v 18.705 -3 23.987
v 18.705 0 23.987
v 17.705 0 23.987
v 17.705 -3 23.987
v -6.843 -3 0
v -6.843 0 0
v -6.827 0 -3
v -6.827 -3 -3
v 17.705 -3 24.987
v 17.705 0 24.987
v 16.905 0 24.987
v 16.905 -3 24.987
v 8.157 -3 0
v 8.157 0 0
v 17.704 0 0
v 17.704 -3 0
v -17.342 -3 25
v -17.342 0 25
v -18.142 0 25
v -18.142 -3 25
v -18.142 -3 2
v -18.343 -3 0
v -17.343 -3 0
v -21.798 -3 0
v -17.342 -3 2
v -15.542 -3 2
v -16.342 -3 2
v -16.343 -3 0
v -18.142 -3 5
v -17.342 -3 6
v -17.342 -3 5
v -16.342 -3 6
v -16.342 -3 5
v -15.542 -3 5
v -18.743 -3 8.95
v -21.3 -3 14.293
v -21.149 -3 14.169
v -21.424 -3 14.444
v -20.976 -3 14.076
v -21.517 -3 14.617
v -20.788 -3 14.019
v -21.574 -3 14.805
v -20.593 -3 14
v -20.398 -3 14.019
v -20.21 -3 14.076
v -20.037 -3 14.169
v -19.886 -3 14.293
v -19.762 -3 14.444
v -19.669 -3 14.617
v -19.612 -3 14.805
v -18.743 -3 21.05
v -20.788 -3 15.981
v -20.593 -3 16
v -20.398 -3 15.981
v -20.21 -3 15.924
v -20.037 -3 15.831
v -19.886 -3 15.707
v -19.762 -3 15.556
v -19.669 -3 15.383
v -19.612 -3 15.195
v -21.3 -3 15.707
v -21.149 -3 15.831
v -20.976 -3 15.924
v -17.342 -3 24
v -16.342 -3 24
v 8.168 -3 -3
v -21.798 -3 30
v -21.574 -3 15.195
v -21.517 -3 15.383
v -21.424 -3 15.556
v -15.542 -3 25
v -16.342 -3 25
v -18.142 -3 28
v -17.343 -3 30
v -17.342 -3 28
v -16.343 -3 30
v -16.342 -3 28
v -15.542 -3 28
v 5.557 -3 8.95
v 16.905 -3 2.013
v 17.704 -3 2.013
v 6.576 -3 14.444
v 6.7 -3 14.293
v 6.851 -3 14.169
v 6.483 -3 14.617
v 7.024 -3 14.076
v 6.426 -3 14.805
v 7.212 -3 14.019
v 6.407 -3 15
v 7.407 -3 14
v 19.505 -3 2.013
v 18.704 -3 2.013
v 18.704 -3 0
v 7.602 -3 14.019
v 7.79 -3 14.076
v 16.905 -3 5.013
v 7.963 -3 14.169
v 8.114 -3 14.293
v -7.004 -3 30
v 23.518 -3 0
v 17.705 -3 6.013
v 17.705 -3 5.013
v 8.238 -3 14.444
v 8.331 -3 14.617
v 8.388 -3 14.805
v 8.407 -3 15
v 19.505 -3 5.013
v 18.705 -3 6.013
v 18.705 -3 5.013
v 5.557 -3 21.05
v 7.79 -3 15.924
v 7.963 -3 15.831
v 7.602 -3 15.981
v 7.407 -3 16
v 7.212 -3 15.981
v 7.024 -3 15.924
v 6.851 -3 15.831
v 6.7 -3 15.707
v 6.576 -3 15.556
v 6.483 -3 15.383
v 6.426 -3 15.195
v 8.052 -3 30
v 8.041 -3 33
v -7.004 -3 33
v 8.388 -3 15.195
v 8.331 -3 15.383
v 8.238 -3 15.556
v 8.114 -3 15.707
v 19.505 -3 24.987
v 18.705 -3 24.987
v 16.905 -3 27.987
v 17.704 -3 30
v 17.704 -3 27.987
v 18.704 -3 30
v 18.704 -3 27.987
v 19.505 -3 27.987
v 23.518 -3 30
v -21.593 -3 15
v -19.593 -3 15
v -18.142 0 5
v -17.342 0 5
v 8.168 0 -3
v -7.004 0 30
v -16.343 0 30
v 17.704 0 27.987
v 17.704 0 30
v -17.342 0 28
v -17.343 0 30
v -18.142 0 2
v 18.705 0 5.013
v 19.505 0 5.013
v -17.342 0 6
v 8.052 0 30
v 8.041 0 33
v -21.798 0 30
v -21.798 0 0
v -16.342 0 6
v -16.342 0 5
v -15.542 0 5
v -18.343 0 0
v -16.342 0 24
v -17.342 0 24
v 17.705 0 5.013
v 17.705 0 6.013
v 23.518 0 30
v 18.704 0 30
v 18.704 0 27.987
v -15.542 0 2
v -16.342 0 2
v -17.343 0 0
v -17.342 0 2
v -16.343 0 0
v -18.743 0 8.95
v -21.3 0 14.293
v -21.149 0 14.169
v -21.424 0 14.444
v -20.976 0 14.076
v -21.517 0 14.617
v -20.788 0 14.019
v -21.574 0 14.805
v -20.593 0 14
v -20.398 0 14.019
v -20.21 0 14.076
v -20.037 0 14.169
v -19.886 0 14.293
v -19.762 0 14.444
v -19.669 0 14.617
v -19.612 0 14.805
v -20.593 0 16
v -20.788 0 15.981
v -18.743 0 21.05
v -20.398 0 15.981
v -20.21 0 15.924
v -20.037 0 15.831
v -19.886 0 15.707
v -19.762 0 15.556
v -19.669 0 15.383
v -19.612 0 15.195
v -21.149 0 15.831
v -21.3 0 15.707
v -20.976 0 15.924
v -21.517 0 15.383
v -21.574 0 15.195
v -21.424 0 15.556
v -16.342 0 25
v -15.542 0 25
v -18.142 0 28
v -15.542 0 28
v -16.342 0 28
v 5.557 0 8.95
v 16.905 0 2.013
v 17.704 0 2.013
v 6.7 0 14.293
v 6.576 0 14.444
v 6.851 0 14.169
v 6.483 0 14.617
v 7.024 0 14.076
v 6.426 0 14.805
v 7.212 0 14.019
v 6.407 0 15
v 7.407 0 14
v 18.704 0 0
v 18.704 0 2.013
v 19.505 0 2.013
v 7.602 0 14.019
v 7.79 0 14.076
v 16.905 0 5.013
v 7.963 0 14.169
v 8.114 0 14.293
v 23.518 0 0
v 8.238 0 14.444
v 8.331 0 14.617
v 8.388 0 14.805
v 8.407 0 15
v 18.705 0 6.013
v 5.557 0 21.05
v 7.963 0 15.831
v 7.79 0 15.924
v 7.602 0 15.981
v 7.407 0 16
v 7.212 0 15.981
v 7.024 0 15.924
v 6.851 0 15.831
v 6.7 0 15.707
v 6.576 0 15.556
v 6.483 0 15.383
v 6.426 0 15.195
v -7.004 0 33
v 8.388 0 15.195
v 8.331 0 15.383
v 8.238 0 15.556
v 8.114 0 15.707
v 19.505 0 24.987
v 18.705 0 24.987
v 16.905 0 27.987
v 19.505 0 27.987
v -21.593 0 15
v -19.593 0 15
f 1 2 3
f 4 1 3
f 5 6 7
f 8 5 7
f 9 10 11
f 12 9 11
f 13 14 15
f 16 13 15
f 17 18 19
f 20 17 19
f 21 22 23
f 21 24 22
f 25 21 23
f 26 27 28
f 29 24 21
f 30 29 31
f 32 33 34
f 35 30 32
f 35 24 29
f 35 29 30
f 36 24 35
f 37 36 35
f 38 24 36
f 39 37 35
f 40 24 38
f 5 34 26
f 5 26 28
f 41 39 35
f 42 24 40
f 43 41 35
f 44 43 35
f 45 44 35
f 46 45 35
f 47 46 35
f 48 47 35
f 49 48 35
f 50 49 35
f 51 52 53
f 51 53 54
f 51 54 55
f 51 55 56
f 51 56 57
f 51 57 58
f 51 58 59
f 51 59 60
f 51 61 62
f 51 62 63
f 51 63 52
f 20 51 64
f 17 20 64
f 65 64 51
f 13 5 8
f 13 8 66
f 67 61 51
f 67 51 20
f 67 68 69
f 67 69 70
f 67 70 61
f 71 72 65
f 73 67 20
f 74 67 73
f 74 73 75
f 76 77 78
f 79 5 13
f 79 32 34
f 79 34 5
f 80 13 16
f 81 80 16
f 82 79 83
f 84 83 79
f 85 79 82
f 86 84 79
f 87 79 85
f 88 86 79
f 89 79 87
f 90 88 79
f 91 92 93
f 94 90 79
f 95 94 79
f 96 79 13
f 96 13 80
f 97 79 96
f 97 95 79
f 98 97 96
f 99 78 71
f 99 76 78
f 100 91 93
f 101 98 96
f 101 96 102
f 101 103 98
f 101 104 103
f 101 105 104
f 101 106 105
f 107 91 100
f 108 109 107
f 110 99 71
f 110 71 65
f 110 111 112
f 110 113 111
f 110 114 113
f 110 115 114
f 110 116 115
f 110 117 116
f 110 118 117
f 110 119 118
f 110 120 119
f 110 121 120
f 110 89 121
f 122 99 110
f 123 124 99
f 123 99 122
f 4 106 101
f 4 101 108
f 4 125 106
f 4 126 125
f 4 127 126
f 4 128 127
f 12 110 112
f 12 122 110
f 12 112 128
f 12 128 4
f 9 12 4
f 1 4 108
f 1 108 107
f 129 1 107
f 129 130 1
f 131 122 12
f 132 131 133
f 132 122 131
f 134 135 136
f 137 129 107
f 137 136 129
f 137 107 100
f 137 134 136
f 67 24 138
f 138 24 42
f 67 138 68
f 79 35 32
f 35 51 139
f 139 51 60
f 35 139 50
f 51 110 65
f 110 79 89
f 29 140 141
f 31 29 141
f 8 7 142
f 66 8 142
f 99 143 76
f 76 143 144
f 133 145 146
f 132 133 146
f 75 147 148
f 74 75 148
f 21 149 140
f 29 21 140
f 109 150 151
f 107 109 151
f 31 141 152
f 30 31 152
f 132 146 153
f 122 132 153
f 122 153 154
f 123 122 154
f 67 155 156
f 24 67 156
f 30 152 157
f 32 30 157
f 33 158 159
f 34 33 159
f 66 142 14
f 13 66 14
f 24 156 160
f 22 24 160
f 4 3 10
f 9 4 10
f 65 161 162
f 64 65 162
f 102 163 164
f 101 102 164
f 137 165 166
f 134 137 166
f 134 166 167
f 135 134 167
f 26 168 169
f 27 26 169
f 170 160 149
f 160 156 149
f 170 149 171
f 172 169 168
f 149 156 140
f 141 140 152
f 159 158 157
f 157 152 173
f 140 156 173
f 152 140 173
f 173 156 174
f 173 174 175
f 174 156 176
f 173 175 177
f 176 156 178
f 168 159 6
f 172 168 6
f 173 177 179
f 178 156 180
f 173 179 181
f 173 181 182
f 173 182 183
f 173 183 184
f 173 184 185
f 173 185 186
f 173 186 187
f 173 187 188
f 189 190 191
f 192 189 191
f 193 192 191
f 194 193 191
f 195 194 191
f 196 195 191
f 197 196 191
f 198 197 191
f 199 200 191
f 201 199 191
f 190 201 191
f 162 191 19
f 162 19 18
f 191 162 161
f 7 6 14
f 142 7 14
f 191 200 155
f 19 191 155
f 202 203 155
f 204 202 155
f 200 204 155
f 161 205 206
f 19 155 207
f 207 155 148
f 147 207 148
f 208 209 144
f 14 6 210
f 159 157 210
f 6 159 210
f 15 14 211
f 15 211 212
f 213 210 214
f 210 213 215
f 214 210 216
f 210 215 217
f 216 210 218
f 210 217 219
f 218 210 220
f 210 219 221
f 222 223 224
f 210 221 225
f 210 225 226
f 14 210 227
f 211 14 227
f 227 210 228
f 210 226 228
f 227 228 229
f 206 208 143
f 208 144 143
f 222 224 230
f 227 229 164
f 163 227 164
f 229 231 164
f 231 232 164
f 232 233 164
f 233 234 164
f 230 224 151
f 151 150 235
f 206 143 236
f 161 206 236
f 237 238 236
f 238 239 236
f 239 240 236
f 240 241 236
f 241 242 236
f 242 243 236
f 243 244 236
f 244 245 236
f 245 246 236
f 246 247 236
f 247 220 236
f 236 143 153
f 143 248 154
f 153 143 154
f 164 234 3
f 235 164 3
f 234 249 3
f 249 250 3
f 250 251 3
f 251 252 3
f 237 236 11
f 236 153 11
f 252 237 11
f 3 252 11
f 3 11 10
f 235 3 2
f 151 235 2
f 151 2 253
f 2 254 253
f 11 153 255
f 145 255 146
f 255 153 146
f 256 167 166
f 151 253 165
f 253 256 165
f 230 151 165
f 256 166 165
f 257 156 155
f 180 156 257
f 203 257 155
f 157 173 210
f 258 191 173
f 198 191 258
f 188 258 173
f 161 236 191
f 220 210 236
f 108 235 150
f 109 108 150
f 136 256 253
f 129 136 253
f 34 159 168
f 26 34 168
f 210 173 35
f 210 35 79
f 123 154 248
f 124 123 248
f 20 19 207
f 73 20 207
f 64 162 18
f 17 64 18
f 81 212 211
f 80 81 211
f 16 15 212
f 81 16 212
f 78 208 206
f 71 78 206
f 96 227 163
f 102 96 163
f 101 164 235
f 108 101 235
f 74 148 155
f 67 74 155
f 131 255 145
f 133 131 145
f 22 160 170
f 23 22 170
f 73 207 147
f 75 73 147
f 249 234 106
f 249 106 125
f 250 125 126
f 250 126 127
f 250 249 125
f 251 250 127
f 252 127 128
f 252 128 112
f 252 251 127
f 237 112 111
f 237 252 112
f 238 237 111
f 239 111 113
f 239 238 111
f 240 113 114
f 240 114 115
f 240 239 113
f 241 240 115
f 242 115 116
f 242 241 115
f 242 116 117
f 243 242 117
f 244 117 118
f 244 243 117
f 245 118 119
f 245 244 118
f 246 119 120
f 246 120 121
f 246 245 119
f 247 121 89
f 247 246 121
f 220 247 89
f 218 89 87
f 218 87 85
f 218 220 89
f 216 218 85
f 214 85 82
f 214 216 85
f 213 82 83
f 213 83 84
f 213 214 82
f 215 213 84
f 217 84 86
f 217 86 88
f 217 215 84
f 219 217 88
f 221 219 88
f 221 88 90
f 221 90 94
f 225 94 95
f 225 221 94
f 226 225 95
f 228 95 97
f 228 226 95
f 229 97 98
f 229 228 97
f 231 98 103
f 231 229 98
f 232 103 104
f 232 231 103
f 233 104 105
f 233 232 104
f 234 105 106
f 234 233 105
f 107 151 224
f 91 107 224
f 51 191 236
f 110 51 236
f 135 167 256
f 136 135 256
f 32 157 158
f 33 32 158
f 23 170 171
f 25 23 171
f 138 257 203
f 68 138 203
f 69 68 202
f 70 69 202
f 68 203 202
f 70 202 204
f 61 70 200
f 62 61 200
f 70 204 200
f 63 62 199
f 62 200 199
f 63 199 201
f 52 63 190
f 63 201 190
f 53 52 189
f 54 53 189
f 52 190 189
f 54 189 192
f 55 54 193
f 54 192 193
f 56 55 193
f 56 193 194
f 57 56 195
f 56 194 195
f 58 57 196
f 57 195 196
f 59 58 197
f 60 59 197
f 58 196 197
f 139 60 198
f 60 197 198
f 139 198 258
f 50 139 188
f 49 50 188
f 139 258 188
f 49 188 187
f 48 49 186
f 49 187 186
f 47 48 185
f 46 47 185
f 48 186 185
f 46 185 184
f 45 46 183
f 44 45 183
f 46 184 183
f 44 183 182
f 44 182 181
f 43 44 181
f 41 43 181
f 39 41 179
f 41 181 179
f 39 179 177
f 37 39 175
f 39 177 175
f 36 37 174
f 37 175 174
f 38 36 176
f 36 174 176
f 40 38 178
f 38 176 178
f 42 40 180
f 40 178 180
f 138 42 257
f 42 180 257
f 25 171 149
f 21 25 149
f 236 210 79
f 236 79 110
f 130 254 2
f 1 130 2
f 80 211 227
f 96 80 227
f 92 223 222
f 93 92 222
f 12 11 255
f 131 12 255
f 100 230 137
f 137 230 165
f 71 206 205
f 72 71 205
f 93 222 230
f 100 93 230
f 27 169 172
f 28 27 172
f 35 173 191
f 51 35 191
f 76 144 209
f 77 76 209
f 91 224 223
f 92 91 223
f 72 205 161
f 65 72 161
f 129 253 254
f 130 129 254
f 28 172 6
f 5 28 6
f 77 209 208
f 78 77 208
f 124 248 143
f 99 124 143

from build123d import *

# Parameters (mm, degrees)
F3_W     = 24.3006017764
F3_H     = 12.100000065
F3_R     = 1
F4_DEPTH = 3


# Not quite as in the source:
# - ends of sketch curves that miss each other by under 0.0002 mm in the source are joined


with BuildPart() as f4:
    # F3 (on Front) → F4 (new body)
    with BuildSketch(Plane.XZ):
        Polygon((-18.3427034128, 0), (-17.3427034128, 0), (-17.3423305717, 1.9999998262), (-18.1417713099, 1.9999998262), (-18.1417713099, 4.9999998262), (-17.3417713099, 4.9999998262), (-17.3415848893, 5.9999998262), (-16.3415848684, 5.9999998262), (-16.3417712925, 4.9999998262), (-15.5417712925, 4.9999998262), (-15.5417712925, 1.9999998262), (-16.3423305647, 1.9999998262), (-16.3427034128, 0), (-15.3427034128, 0), (-6.8427034128, 0), (8.1310835591, 0), (8.1572965872, 0), (16.6572965872, 0), (17.7038592511, 0), (17.704234553, 2.0131421474), (16.9047938148, 2.0131421517), (16.9047938308, 5.0131421517), (17.7047938308, 5.0131421475), (17.7049802567, 6.0131421474), (18.7049802776, 6.0131421421), (18.7047938482, 5.0131421421), (19.5047938482, 5.0131421378), (19.5047938321, 2.0131421378), (18.7042345599, 2.0131421421), (18.703859251, 0), (19.6572965872, 0), (23.5180836171, 0), (23.5180836171, 30), (18.7038593313, 30), (18.7042346294, 27.9868579887), (19.5047939016, 27.9868579887), (19.5047939016, 24.9868579887), (18.7047939016, 24.9868579887), (18.7049803257, 23.9868579887), (17.7049803048, 23.9868579887), (17.7047938842, 24.9868579887), (16.9047938842, 24.9868579887), (16.9047938842, 27.9868579887), (17.7042346225, 27.9868579887), (17.7038593313, 30), (8.0515714362, 30), (0, 30), (-7.0037143305, 30), (-16.3427034128, 30), (-16.3423305647, 28.0000001738), (-15.5417712925, 28.0000001738), (-15.5417712925, 25.0000001738), (-16.3417712925, 25.0000001738), (-16.3415848684, 24.0000001738), (-17.3415848893, 24.0000001738), (-17.3417713099, 25.0000001738), (-18.1417713099, 25.0000001738), (-18.1417713099, 28.0000001738), (-17.3423305717, 28.0000001738), (-17.3427034128, 30), (-21.7979144805, 30), (-21.7979144805, 28.0000001738), (-21.7979144805, 25.0000001738), (-21.7979144805, 24.0000001738), (-21.7979144805, 15.0000001738), (-21.7979144805, 1.738e-07), align=None)
        with BuildLine():
            ThreePointArc((-19.593004301, 15.0000001705), (-20.5930043024, 14.0000001705), (-21.593004301, 15.0000001732))
            ThreePointArc((-21.593004301, 15.0000001732), (-20.5930042997, 16.0000001705), (-19.593004301, 15.0000001705))
        make_face(mode=Mode.SUBTRACT)
        with Locations((-6.593004301, 15.0000001331)):
            Rectangle(F3_W, F3_H, mode=Mode.SUBTRACT)
        with Locations((7.406995699, 15.0000000956)):
            Circle(F3_R, mode=Mode.SUBTRACT)
        Polygon((-7.0037143305, 33), (-7.0037143305, 30), (0, 30), (8.0515714362, 30), (8.0409989211, 33), align=None)
        Polygon((8.1310835591, 0), (-6.8427034128, 0), (-6.826602321, -3), (0, -3), (8.1678691023, -3), (8.1572965872, 0), align=None)
    extrude(amount=F4_DEPTH)


solid = f4.part
